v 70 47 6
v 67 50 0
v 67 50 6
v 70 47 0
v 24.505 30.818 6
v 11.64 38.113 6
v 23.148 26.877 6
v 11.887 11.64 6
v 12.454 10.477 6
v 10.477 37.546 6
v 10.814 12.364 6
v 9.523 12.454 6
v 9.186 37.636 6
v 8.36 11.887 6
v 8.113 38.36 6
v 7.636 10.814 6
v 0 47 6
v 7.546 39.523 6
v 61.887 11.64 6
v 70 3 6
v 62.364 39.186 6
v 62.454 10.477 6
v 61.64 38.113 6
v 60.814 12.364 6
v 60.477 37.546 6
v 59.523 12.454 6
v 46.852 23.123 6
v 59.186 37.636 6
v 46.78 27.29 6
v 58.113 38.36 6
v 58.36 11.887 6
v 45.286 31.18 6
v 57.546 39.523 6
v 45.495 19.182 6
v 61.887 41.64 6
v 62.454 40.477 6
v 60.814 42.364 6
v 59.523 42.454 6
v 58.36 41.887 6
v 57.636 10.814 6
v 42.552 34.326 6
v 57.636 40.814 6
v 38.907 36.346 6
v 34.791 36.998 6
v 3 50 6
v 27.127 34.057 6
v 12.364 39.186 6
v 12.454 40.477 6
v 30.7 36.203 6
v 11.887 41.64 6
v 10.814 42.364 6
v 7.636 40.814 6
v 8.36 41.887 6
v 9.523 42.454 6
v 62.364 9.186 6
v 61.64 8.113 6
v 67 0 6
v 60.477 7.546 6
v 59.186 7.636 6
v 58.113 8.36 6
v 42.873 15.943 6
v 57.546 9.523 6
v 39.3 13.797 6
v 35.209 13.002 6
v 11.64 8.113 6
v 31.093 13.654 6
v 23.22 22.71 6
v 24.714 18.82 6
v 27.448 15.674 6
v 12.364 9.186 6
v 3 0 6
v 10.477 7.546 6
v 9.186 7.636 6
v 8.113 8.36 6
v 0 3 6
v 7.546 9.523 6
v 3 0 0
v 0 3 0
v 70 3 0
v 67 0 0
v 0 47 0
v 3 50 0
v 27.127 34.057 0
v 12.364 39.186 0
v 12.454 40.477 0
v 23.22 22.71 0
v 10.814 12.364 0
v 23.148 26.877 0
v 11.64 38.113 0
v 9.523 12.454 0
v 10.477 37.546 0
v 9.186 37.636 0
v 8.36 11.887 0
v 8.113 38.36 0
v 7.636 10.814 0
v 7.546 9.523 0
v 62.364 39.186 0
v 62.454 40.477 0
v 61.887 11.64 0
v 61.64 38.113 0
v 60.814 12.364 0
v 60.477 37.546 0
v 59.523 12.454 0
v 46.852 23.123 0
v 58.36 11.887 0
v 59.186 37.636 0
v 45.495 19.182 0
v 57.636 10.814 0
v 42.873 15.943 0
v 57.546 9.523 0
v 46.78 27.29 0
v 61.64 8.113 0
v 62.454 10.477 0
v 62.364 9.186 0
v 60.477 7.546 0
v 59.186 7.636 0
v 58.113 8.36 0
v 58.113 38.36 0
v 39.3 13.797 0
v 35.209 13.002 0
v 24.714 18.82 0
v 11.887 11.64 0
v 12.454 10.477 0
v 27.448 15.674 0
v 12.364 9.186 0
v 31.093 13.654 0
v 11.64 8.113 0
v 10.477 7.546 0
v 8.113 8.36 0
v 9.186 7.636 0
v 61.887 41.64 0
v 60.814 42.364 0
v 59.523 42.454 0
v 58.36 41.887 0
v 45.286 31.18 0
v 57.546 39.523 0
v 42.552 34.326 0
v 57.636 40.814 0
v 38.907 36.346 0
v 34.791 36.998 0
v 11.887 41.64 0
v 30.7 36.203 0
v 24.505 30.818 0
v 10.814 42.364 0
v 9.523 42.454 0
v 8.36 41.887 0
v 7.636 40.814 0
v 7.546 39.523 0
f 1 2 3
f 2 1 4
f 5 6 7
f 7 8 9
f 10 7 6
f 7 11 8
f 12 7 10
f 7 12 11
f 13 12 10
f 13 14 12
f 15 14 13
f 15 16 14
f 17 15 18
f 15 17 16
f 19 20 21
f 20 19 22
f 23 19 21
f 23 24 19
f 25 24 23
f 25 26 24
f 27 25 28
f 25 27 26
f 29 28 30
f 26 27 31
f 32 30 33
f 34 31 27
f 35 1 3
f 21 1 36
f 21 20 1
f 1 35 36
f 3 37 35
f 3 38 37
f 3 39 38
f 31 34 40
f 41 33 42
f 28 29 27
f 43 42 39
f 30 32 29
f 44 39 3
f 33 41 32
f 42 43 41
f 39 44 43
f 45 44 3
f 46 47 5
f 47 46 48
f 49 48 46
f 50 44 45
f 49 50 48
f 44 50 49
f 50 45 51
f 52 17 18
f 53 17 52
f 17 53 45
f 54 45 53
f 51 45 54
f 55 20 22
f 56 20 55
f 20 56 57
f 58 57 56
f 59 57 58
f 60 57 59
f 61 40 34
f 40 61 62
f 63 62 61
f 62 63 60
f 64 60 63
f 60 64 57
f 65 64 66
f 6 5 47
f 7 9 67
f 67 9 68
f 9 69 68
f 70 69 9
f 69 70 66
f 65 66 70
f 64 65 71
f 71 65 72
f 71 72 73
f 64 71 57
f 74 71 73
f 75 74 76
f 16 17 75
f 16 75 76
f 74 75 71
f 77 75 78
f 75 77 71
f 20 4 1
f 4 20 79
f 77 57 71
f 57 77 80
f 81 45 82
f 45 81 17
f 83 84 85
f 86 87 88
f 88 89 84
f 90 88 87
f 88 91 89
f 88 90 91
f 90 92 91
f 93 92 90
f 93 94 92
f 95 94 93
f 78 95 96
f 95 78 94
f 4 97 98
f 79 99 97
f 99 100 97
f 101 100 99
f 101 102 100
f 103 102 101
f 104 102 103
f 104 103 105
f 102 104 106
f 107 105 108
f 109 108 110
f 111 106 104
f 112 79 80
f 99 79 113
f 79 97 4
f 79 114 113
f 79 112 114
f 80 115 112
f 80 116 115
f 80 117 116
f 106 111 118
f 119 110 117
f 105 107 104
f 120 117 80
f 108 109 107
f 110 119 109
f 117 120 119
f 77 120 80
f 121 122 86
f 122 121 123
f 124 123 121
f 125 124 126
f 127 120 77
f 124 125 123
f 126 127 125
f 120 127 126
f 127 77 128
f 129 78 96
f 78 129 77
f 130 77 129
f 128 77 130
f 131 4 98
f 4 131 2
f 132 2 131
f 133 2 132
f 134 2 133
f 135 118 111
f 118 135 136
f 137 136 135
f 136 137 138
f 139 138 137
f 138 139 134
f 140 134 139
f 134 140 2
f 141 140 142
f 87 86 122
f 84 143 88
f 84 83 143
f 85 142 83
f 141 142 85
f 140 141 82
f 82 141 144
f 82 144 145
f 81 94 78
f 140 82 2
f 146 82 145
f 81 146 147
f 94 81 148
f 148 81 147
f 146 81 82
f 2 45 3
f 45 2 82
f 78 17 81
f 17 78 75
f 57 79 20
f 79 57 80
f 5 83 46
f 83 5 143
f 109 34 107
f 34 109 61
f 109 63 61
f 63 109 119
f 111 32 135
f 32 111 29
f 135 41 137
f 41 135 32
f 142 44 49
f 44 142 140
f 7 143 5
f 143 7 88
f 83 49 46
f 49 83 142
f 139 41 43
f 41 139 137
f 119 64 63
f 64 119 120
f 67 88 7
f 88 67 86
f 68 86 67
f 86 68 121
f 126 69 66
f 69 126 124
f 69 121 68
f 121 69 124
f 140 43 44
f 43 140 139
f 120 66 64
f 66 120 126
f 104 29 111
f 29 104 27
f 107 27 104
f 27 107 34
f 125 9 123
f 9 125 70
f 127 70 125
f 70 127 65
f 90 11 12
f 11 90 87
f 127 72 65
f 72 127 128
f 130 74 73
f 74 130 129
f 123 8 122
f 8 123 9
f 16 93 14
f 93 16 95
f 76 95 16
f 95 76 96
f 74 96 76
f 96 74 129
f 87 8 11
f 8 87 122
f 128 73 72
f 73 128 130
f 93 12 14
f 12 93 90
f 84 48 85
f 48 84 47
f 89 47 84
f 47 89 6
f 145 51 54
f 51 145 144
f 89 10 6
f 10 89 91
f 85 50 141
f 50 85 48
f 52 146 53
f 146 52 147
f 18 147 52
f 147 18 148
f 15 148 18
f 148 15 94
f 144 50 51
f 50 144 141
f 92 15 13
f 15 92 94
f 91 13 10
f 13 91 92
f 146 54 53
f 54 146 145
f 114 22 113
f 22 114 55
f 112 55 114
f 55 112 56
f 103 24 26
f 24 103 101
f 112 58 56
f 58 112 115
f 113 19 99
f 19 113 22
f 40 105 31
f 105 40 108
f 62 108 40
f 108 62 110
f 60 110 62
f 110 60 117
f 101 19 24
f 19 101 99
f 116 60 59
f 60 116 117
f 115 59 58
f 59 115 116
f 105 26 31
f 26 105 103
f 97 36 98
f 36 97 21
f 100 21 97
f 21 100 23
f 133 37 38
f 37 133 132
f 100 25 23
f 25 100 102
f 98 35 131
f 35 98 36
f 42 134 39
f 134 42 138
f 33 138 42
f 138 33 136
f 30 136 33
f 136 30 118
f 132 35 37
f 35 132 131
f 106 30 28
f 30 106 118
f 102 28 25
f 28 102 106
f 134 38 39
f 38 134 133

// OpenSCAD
$fn = 32;

// ----------------------------------------------------------------------
// Spacer plate: rect 70 x 50
// ----------------------------------------------------------------------

// --- parameters (mm) ---
bore_r = 12;              // centre bore radius
bolt_r = 2.5;             // bolt hole radius
plate_t = 6;              // plate thickness, Z (extrusion height)
plate_l = 70;             // plate length, X
plate_w = 50;             // plate width, Y
inset = 10;               // corner hole inset

profile = [[3, 0], [67, 0], [70, 3], [70, 47], [67, 50], [3, 50], [0, 47], [0, 3]];  // primary outline, 8 points, counter clockwise
void_1 = [[46.78, 27.29], [45.286, 31.18], [42.552, 34.326], [38.907, 36.346], [34.791, 36.998], [30.7, 36.203], [27.127, 34.057], [24.505, 30.818], [23.148, 26.877], [23.22, 22.71], [24.714, 18.82], [27.448, 15.674], [31.093, 13.654], [35.209, 13.002], [39.3, 13.797], [42.873, 15.943], [45.495, 19.182], [46.852, 23.123]];  // centre bore, 18 points
void_2 = [[12.454, 10.477], [11.887, 11.64], [10.814, 12.364], [9.523, 12.454], [8.36, 11.887], [7.636, 10.814], [7.546, 9.523], [8.113, 8.36], [9.186, 7.636], [10.477, 7.546], [11.64, 8.113], [12.364, 9.186]];  // corner hole, 12 points
void_3 = [[12.454, 40.477], [11.887, 41.64], [10.814, 42.364], [9.523, 42.454], [8.36, 41.887], [7.636, 40.814], [7.546, 39.523], [8.113, 38.36], [9.186, 37.636], [10.477, 37.546], [11.64, 38.113], [12.364, 39.186]];  // corner hole, 12 points
void_4 = [[62.454, 10.477], [61.887, 11.64], [60.814, 12.364], [59.523, 12.454], [58.36, 11.887], [57.636, 10.814], [57.546, 9.523], [58.113, 8.36], [59.186, 7.636], [60.477, 7.546], [61.64, 8.113], [62.364, 9.186]];  // corner hole, 12 points
void_5 = [[62.454, 40.477], [61.887, 41.64], [60.814, 42.364], [59.523, 42.454], [58.36, 41.887], [57.636, 40.814], [57.546, 39.523], [58.113, 38.36], [59.186, 37.636], [60.477, 37.546], [61.64, 38.113], [62.364, 39.186]];  // corner hole, 12 points

// --- the one profile operation ---
difference() {
  linear_extrude(height = plate_t) polygon(points = profile);
  translate([0, 0, -1])
    linear_extrude(height = plate_t + 2) polygon(points = void_1);
  translate([0, 0, -1])
    linear_extrude(height = plate_t + 2) polygon(points = void_2);
  translate([0, 0, -1])
    linear_extrude(height = plate_t + 2) polygon(points = void_3);
  translate([0, 0, -1])
    linear_extrude(height = plate_t + 2) polygon(points = void_4);
  translate([0, 0, -1])
    linear_extrude(height = plate_t + 2) polygon(points = void_5);
}
